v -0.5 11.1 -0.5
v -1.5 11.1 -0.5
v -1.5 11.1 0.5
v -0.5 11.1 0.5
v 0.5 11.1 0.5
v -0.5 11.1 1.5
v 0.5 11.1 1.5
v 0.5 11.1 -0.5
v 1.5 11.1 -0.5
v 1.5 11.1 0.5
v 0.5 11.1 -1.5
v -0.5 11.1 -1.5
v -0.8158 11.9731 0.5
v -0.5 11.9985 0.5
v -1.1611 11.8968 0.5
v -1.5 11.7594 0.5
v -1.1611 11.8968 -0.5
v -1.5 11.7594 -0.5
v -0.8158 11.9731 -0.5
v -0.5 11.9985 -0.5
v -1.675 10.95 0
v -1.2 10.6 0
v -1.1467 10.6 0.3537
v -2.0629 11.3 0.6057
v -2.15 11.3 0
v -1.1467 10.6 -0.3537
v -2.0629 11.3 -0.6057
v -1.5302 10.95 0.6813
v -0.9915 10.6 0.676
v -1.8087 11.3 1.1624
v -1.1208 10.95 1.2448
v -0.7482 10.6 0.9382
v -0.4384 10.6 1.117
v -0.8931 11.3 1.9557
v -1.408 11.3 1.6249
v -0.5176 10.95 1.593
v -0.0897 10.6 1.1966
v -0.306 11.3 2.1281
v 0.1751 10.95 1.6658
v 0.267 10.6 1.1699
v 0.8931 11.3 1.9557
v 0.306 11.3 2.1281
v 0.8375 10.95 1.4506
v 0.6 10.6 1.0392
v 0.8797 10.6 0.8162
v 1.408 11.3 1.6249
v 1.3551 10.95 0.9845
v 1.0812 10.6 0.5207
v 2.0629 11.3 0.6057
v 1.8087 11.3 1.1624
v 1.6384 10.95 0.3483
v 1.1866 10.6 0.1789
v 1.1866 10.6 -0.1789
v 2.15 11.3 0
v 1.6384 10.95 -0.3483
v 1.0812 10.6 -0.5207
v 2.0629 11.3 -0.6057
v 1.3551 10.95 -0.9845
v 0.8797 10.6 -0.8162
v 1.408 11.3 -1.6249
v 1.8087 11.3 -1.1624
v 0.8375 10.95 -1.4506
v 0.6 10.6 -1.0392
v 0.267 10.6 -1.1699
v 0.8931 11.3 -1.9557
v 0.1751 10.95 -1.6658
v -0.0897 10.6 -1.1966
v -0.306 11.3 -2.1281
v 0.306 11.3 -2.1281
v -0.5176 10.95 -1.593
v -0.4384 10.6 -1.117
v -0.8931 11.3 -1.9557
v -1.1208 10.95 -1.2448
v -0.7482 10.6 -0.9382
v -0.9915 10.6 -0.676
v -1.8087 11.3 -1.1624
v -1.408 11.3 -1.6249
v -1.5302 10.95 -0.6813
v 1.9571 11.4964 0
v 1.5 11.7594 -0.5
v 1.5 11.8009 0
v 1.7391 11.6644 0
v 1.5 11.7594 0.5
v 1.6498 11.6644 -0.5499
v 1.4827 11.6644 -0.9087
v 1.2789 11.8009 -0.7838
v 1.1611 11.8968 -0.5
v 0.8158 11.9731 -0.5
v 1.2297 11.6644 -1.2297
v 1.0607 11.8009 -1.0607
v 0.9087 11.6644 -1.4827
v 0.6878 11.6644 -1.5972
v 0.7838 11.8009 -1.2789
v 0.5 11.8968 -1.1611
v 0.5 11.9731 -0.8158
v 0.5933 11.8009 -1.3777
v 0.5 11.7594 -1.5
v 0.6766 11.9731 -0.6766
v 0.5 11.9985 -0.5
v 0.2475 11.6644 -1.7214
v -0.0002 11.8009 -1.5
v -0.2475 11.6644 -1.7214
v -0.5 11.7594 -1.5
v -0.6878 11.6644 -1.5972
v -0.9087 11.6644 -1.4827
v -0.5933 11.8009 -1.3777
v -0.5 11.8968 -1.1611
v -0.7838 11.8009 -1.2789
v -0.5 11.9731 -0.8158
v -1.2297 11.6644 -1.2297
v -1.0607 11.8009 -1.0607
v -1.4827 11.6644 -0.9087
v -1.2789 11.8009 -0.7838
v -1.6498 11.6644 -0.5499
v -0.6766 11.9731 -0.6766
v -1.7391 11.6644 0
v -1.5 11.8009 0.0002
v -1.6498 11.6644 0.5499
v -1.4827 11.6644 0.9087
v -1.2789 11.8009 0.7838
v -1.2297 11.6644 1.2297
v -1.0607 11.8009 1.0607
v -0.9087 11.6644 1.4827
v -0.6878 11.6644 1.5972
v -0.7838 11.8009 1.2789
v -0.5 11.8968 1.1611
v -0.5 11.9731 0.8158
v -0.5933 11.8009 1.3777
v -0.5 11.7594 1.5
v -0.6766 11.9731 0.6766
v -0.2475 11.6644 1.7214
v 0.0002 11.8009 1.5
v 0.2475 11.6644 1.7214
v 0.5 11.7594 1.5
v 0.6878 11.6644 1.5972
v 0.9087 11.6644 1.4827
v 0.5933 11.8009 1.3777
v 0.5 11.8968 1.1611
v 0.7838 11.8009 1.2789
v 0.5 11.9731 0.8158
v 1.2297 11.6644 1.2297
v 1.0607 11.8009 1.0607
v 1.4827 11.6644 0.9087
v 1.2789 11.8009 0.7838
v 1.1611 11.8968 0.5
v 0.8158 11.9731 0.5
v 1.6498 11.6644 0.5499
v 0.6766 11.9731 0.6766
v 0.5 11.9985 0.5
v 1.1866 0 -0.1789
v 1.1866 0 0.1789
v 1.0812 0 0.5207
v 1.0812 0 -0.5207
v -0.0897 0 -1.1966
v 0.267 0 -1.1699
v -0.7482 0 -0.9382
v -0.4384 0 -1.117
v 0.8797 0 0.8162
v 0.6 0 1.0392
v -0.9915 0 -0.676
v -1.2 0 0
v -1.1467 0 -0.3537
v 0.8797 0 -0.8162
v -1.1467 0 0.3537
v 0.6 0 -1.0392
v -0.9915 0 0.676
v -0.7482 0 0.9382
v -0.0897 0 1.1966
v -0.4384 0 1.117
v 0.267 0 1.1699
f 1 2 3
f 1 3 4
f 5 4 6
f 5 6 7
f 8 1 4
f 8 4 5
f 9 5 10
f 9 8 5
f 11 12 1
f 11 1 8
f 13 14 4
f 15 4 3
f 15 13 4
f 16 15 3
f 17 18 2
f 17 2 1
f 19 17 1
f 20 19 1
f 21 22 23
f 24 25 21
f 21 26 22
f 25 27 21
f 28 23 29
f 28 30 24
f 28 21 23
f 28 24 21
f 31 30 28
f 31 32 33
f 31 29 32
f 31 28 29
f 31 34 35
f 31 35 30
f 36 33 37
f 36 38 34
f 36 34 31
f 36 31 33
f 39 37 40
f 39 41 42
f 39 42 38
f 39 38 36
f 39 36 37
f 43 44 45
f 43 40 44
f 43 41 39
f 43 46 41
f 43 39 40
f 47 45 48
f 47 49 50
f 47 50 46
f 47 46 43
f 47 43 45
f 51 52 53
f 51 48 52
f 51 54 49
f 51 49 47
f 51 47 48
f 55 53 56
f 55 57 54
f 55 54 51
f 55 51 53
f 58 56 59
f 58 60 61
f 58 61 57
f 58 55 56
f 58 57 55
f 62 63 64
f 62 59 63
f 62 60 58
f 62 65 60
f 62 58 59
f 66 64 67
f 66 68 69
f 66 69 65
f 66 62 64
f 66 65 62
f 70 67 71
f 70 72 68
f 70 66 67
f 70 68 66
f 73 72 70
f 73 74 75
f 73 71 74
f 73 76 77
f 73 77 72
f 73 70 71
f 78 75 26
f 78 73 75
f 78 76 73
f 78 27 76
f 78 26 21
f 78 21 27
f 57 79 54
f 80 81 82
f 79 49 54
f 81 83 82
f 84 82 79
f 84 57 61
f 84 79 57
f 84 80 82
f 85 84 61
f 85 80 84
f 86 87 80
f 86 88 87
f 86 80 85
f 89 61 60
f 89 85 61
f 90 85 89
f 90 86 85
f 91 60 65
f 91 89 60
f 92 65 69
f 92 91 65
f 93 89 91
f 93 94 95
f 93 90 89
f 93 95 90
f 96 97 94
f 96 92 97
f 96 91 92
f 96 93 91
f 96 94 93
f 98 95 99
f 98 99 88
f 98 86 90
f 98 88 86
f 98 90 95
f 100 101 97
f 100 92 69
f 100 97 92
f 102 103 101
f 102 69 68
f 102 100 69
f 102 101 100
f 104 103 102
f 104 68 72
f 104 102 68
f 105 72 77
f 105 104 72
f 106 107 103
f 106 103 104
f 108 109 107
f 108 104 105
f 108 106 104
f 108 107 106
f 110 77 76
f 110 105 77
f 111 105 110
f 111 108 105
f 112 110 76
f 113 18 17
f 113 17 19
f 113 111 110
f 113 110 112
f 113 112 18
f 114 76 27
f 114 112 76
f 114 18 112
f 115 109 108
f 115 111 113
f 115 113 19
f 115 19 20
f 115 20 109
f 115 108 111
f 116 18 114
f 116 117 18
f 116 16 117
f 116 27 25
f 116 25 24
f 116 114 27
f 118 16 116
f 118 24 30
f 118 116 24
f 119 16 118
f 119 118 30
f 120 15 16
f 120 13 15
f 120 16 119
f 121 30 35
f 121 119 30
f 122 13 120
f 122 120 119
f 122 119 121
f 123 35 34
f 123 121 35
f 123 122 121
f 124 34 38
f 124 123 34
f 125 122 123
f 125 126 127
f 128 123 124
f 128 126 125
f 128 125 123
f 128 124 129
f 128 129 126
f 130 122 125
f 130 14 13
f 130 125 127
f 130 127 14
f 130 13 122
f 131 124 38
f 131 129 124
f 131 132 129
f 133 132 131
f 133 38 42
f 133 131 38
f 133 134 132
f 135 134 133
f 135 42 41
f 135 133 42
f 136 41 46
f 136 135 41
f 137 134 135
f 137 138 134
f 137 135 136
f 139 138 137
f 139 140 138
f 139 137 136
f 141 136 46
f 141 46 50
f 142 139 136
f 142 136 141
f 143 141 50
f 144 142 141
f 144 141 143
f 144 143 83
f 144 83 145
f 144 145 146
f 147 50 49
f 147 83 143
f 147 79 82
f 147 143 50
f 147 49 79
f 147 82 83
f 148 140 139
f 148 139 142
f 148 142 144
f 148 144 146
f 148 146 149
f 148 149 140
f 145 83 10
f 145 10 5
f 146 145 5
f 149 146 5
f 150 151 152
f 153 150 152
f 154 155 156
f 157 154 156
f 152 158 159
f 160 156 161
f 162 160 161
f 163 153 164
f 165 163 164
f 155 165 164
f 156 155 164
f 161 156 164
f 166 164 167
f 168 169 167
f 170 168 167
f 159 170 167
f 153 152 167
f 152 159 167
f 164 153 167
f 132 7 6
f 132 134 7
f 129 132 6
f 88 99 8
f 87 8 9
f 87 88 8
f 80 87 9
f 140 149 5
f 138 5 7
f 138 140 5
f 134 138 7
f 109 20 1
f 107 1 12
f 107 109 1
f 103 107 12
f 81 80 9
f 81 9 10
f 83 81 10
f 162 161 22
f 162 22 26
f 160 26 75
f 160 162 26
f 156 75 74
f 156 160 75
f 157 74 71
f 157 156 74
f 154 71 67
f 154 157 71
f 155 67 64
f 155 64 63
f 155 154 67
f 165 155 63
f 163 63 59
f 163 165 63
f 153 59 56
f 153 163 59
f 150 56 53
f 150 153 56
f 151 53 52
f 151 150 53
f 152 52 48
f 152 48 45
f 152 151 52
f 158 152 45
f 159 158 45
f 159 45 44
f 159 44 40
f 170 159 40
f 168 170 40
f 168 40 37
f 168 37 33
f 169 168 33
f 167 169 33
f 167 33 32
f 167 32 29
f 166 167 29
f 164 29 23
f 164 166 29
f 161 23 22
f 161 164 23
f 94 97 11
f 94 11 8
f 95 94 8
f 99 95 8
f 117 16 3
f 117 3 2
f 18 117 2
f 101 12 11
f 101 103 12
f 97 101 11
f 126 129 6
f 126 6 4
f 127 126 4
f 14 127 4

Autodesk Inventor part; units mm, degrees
ref_plane "YZ Plane" through (0, 0, 0) normal (1, 0, 0) x (0, 1, 0)
sketch "Sketch1" plane through (0, 0, 0) normal (0, 1, 0) x (-1, 0, 0)
  circle A0 centre (0, 0) radius 1.2
  dimension "d0" = 2.4
extrude "Extrusion1" add sketch "Sketch1" along normal blind 10.6
thread "Thread1" size "M3x0.5" class "6g" standard "ANSI Metric M Profile" length 10 offset 1
ref_plane "Work Plane1" through (0, 11.3, 0) normal (0, 1, 0) x (1, 0, 0)
sketch "Sketch3" plane through (0, 11.3, 0) normal (0, 1, 0) x (1, 0, 0)
  circle A0 centre (0, 0) radius 2.15
  dimension "d6" = 4.3
loft "Loft1" add profiles "Sketch3" section 1 edges at (1.2, 10.6, 0)
sketch "Sketch5" plane through (0, 11.3, 0) normal (0, 1, 0) x (1, 0, 0)
  circle A0 centre (0, 0) radius 2.15
extrude "Extrusion2" add sketch "Sketch5" along normal blind 0.7
fillet "Fillet1" radius 2 1 edges at (-2.15, 12, 0)
ref_plane "Work Plane2" through (0, 12.1, 0) normal (0, 1, 0) x (1, 0, 0)
sketch "Sketch7" plane through (0, 12.1, 0) normal (0, 1, 0) x (1, 0, 0)
  line L0 (-1.5, -0.5) -> (-1.5, 0.5)
  line L1 (1.5, 0.5) -> (1.5, -0.5)
  line L2 (-0.5, 1.5) -> (0.5, 1.5)
  line L3 (0.5, -1.5) -> (-0.5, -1.5)
  line L4 (1.5, -0.5) -> (0.5, -0.5)
  line L5 (-0.5, -0.5) -> (-1.5, -0.5)
  line L6 (0.5, 1.5) -> (0.5, 0.5)
  line L7 (0.5, -0.5) -> (0.5, -1.5)
  line L8 (-1.5, 0.5) -> (-0.5, 0.5)
  line L9 (0.5, 0.5) -> (1.5, 0.5)
  line L10 (-0.5, -1.5) -> (-0.5, -0.5)
  line L11 (-0.5, 0.5) -> (-0.5, 1.5)
  dimension "d22" = 3
  dimension "d23" = 1
  dimension "d24" = 3
  dimension "d25" = 1
extrude "Extrusion4" cut sketch "Sketch7" against normal blind 1
equation "\"BendRadius\" = Thickness"
equation "\"BendReliefWidth\" = Thickness"
equation "\"BendReliefDepth\" = 0.5 * Thickness"
equation "\"CornerReliefSize\" = 4 * Thickness"
equation "\"MinimumRemnant\" = 2 * Thickness"
equation "\"TransitionRadius\" = BendRadius"
equation "\"JacobiRadiusSize\" = BendRadius"
equation "\"GapSize\" = Thickness"
equation "\"Thickness\" = 0.5"
properties part number "Parafuso menor Tarraxa"
